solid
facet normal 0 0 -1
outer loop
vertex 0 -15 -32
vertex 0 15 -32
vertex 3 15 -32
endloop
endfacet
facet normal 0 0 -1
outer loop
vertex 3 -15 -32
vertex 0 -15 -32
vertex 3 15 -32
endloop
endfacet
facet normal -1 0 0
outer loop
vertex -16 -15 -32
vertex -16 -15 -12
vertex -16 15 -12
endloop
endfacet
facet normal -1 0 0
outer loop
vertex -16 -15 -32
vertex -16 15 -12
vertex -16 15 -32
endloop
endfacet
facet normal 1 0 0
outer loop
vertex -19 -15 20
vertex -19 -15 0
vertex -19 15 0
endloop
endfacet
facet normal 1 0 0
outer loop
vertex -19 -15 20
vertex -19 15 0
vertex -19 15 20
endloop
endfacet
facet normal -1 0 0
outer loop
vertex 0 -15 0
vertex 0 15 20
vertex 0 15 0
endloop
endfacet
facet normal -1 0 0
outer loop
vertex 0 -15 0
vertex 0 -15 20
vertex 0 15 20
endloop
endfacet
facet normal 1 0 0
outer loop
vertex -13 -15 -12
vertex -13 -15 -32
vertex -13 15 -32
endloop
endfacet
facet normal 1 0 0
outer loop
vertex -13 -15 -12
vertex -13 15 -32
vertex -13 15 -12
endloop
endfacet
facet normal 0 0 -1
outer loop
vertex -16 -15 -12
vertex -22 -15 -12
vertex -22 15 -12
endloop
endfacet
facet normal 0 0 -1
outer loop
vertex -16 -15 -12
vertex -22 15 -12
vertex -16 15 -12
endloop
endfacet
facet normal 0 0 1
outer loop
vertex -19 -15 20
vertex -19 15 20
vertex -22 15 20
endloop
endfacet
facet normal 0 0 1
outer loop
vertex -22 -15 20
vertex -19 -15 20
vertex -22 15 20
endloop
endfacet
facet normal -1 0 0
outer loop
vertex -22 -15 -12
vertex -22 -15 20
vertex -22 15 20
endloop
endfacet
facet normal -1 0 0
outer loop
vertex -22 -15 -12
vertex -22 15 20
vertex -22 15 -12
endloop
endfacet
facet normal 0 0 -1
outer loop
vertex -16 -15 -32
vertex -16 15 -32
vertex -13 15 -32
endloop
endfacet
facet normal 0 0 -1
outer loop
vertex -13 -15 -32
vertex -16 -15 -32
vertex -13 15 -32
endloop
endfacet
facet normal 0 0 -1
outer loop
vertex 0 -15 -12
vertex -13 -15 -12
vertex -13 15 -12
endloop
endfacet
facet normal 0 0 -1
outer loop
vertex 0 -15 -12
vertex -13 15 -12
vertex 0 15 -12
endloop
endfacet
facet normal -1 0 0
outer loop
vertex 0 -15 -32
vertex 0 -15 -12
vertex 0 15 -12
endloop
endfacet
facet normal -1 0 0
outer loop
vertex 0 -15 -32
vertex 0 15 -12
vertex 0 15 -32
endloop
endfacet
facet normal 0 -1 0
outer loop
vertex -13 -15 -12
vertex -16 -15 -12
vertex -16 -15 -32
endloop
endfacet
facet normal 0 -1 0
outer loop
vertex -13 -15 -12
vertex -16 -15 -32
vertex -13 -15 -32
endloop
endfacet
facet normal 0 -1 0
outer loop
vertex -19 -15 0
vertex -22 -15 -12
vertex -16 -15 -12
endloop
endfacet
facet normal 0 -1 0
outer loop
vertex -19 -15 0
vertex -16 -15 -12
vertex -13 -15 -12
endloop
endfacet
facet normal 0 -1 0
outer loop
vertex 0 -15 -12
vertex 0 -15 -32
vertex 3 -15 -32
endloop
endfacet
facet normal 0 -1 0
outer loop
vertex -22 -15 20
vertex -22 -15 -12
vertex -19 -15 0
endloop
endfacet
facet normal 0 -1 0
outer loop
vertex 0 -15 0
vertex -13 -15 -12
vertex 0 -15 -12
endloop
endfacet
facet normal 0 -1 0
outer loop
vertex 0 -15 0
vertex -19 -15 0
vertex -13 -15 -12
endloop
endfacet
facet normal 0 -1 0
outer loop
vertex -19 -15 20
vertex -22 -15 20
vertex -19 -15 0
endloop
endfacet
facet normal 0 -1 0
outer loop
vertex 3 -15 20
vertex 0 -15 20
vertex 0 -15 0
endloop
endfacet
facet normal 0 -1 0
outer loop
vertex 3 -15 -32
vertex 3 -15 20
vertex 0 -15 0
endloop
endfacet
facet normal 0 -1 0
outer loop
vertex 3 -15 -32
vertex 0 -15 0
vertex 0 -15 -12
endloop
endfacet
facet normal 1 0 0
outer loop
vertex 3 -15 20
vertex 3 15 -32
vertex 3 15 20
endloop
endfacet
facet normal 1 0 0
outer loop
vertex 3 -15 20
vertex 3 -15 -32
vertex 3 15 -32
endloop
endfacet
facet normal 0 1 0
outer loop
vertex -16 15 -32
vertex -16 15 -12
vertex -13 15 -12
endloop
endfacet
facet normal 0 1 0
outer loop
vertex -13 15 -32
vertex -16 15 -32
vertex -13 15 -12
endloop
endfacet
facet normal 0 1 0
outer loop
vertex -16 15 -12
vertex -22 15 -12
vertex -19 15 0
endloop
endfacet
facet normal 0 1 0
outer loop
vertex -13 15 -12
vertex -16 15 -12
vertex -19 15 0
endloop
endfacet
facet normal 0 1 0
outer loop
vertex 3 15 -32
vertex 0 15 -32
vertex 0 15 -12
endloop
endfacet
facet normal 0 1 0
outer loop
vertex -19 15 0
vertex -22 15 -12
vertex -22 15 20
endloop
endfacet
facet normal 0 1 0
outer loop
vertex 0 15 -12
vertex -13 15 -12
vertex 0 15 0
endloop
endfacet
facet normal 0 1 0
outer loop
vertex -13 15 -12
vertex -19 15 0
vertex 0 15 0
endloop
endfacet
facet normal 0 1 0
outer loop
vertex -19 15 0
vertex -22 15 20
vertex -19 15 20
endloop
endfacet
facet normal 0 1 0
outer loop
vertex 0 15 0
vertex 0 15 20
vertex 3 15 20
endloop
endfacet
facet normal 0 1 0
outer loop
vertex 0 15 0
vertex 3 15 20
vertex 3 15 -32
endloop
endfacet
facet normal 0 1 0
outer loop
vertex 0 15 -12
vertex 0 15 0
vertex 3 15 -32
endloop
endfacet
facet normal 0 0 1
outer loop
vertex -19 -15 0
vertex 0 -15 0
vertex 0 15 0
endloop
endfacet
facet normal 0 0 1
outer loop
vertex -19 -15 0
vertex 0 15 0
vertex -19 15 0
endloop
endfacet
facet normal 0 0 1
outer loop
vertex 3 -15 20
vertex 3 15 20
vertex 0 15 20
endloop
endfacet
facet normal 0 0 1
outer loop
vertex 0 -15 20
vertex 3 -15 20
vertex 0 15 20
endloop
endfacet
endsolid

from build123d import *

# Parameters (mm, degrees)
F1_DEPTH      = 15
F1_DEPTH_BACK = 15


with BuildPart() as f1:
    # F0 (on Front) → F1 (new body, two sides)
    with BuildSketch(Plane.XZ) as f1_sk:
        Polygon((0, 20), (0, 0), (-13, 0), (-16, 0), (-19, 0), (-19, 20), (-22, 20), (-22, 0), (-22, -12), (-16, -12), (-16, -32), (-13, -32), (-13, -29.301528), (-13, -12), (0, -12), (0, -32), (3, -32), (3, 20), align=None)
    extrude(amount=F1_DEPTH)
    extrude(f1_sk.sketch, amount=-F1_DEPTH_BACK)


solid = f1.part
